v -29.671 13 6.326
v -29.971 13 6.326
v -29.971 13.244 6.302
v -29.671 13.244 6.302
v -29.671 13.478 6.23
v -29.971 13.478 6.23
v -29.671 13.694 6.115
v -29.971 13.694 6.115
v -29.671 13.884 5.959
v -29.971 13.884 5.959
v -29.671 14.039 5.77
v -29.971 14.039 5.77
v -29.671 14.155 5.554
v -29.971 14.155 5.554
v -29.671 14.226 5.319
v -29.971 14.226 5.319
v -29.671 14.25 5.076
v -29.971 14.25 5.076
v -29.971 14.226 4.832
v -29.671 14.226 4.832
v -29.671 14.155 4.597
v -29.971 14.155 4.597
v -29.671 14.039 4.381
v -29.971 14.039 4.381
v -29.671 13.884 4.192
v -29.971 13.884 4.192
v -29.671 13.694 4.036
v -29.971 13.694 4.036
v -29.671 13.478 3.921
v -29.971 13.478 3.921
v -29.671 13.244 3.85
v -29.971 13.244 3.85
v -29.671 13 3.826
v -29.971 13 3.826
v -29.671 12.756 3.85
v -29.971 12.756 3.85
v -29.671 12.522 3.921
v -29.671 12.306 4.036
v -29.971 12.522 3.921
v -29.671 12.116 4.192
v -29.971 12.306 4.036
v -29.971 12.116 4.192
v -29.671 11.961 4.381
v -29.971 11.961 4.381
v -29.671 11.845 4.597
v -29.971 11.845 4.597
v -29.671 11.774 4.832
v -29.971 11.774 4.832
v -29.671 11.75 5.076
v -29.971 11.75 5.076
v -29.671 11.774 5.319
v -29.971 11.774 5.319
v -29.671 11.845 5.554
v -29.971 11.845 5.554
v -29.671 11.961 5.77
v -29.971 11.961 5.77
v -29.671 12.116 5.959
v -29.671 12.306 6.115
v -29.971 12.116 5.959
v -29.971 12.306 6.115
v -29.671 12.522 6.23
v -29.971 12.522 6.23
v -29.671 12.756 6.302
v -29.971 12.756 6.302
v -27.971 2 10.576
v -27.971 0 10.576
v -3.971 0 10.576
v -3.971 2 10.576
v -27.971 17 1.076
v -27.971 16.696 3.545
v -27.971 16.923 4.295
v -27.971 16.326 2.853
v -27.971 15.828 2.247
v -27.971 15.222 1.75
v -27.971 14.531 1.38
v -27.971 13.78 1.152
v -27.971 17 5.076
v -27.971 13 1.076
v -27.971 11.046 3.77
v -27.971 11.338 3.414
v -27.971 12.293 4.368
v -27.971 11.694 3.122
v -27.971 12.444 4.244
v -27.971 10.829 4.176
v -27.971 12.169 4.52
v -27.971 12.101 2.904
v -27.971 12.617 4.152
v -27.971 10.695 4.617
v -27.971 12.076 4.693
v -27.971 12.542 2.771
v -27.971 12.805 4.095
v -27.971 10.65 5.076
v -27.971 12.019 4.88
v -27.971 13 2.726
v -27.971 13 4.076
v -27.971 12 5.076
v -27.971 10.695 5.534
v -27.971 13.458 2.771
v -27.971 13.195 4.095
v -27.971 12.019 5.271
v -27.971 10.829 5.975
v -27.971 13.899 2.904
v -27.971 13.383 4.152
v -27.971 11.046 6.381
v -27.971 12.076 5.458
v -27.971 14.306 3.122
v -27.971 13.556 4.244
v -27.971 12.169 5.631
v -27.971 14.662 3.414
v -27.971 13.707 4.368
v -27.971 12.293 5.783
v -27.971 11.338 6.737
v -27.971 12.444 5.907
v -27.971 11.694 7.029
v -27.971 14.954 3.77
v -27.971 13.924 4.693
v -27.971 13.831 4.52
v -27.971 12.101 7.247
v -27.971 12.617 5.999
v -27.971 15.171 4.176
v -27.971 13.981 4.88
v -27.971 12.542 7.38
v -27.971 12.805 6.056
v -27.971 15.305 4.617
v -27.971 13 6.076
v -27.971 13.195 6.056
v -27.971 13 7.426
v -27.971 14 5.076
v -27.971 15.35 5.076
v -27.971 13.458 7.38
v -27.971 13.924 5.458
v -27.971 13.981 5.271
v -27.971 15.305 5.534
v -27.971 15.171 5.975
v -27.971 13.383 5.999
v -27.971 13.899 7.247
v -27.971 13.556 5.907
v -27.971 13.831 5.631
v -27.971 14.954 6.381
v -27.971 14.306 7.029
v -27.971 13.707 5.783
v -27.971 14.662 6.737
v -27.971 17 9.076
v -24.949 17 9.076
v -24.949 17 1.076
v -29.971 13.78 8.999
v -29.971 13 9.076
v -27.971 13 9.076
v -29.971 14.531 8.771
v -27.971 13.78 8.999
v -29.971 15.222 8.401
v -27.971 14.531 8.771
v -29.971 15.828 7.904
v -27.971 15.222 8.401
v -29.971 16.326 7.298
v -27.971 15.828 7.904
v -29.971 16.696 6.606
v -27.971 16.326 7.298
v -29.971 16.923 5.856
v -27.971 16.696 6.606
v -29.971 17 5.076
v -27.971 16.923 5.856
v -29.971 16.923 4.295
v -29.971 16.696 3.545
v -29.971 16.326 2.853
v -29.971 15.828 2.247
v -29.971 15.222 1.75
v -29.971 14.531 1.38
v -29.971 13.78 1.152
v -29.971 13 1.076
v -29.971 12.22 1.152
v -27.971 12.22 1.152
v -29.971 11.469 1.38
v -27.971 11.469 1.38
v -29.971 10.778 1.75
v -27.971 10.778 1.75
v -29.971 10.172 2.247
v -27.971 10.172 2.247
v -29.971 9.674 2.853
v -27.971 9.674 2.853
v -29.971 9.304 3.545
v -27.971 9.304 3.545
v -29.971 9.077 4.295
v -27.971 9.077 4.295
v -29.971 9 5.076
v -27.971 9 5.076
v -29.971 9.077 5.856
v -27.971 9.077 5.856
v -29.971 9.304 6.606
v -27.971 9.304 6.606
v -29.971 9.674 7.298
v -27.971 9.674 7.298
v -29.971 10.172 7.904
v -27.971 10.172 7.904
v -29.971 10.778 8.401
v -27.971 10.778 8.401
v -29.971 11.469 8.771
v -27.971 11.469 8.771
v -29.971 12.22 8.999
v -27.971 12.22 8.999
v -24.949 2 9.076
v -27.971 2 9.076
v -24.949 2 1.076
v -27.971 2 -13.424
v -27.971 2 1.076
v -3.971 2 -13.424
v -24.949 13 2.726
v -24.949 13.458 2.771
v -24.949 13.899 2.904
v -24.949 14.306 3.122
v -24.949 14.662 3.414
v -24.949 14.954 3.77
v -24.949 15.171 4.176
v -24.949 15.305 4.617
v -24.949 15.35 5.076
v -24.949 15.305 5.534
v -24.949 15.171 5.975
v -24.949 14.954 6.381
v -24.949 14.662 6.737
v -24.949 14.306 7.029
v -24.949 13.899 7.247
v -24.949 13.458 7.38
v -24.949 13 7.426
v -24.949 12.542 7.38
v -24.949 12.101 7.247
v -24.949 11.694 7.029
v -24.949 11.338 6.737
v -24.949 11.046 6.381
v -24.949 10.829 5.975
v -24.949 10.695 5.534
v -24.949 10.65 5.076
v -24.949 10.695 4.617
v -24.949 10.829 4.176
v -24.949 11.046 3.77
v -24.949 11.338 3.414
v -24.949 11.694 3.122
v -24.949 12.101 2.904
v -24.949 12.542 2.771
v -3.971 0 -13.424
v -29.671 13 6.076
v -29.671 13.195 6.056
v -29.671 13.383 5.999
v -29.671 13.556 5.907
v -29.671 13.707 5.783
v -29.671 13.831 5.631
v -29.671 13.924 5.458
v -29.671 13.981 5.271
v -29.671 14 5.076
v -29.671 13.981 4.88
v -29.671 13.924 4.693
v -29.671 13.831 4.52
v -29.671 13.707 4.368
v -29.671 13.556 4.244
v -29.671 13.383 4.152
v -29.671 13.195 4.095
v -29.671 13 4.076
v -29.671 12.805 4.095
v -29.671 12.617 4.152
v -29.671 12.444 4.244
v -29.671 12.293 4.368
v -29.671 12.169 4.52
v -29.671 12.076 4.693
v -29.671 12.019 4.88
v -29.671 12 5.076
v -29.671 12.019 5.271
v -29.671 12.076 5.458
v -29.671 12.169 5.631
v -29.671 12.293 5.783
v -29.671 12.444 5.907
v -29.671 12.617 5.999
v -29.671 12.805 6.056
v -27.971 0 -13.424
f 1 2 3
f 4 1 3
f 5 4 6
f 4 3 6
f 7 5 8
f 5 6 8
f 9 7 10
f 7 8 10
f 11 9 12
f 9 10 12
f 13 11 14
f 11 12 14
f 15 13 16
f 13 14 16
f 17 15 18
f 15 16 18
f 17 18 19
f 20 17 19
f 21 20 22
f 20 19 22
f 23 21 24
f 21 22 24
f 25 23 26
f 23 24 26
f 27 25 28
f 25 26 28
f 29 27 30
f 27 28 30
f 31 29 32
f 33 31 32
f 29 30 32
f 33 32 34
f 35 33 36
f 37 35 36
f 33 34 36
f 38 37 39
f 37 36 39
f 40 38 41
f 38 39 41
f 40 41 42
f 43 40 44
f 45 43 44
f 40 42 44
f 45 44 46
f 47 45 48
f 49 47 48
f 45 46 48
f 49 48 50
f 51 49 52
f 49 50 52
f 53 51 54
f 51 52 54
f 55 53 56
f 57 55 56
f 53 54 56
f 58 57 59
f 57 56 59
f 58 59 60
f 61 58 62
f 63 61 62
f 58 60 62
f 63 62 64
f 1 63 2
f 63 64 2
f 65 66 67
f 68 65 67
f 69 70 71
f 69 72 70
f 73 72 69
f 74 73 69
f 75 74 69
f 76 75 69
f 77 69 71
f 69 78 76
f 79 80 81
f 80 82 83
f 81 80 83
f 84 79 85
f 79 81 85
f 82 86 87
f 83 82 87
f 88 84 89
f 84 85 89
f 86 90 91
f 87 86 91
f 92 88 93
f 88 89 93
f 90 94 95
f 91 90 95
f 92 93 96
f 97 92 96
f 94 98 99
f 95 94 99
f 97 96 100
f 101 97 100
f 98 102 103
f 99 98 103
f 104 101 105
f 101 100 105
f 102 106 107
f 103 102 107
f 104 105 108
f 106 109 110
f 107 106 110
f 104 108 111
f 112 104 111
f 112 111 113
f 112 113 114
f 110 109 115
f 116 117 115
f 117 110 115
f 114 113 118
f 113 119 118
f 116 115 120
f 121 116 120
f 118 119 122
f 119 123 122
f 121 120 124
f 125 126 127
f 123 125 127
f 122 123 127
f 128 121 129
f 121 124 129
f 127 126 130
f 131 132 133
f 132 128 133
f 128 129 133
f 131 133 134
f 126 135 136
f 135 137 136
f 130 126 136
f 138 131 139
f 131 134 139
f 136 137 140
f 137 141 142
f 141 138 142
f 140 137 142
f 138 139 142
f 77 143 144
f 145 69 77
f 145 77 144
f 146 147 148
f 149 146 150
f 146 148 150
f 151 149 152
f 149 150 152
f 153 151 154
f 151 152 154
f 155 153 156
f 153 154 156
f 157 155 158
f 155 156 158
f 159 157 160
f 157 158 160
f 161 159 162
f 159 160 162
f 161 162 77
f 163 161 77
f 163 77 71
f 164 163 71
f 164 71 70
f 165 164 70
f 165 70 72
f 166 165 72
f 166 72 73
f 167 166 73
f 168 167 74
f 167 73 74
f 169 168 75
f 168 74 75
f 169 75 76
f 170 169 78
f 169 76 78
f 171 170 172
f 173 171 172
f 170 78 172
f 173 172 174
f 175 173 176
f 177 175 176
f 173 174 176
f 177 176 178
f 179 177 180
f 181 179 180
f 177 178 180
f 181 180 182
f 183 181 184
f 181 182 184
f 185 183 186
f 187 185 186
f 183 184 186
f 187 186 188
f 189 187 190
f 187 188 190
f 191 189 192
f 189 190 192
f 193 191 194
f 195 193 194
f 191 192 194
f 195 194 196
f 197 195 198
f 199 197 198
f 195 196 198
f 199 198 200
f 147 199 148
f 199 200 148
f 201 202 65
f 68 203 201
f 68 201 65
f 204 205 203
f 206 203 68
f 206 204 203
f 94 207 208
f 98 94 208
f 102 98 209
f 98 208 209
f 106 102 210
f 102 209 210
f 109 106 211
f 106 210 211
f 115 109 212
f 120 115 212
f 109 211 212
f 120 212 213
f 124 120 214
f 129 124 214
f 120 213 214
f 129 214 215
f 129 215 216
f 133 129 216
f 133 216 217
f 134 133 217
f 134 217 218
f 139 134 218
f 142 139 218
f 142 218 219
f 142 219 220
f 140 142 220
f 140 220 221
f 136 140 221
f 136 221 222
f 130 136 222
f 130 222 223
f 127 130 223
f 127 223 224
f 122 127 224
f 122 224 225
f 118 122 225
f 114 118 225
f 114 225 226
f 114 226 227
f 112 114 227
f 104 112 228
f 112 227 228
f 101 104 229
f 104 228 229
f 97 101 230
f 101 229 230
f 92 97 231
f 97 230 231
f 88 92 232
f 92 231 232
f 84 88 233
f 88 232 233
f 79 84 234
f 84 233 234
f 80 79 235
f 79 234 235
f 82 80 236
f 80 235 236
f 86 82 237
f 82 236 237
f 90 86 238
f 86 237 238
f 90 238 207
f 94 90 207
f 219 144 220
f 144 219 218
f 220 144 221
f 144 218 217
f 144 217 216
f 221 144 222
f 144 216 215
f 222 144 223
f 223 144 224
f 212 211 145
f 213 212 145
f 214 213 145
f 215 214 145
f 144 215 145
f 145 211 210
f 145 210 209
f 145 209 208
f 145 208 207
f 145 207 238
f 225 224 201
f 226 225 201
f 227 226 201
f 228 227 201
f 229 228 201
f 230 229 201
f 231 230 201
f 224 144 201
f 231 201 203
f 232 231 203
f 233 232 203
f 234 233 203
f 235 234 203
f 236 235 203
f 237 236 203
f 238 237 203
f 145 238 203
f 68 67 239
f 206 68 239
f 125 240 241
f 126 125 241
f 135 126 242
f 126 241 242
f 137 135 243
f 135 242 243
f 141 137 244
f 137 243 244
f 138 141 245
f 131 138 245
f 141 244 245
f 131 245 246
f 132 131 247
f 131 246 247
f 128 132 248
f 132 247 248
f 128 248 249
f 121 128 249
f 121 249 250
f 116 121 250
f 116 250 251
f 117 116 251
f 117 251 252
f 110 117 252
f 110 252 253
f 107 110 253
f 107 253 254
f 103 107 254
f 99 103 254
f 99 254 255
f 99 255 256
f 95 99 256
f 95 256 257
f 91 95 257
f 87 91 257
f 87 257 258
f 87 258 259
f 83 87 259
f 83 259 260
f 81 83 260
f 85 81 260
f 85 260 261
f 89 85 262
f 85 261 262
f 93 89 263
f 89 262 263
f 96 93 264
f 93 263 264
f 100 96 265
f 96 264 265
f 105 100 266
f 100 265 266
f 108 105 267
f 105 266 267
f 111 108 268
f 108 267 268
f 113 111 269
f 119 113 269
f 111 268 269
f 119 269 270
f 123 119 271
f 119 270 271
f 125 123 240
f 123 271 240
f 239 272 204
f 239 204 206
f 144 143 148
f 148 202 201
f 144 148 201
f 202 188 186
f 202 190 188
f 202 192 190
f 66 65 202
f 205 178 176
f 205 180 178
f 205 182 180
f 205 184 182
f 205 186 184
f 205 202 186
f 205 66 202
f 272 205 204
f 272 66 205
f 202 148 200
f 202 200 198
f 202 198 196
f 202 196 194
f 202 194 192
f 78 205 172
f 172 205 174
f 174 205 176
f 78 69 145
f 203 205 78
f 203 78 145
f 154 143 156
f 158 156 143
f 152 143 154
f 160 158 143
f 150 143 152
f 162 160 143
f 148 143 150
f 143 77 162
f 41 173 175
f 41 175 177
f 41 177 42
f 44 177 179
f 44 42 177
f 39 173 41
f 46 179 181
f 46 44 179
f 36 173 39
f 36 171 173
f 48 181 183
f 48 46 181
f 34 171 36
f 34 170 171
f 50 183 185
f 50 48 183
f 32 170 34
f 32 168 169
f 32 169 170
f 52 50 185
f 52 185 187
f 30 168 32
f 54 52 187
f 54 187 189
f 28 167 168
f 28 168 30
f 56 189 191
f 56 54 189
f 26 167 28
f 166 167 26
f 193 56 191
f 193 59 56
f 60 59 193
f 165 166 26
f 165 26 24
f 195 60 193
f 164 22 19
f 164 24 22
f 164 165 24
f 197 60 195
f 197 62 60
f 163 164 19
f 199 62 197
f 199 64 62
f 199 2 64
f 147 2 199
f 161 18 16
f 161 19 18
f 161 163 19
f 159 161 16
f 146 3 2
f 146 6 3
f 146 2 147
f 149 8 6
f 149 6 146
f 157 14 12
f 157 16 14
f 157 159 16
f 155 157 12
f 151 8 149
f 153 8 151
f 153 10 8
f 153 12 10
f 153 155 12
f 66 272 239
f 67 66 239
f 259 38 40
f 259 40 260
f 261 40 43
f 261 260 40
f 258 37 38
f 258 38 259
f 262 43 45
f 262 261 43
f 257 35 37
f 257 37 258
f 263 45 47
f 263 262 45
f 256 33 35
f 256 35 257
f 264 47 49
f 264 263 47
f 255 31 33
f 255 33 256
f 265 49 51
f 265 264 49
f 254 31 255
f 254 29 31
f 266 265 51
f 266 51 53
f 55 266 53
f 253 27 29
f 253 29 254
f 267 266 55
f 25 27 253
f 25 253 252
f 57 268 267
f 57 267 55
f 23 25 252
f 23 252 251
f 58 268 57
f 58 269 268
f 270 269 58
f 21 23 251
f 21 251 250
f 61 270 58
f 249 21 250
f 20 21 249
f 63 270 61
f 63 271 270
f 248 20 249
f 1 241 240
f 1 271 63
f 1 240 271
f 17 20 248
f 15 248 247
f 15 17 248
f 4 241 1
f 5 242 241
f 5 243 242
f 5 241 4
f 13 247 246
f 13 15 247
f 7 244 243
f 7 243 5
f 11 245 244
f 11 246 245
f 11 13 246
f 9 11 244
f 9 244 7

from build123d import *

# Parameters (mm, degrees)
SKETCH3_W           = 24
SKETCH3_H           = 24
BOSS_EXTRUDE1_DEPTH = 2
SKETCH4_W           = 3.021973807
SKETCH4_H           = 8
BOSS_EXTRUDE2_DEPTH = 15
SKETCH6_R           = 2.35
CUT_EXTRUDE1_DEPTH  = 3.2
SKETCH7_R           = 4
BOSS_EXTRUDE3_DEPTH = 2
SKETCH8_R           = 1
CUT_EXTRUDE2_DEPTH  = 2
SKETCH9_R           = 1.25
CUT_EXTRUDE3_DEPTH  = 0.3


with BuildPart() as part:
    # Sketch3 → Boss-Extrude1 (new body)
    with BuildSketch(Plane(origin=(0, 0, 0), x_dir=(1, 0, 0), z_dir=(0, 1, 0))):
        with Locations((-15.971223022, 1.424460432)):
            Rectangle(SKETCH3_W, SKETCH3_H)
    extrude(amount=BOSS_EXTRUDE1_DEPTH)

    # Sketch4 → Boss-Extrude2 (add)
    with BuildSketch(Plane(origin=(0, 2, 0), x_dir=(1, 0, 0), z_dir=(0, 1, 0))):
        with Locations((-26.460236118, -5.075539568)):
            Rectangle(SKETCH4_W, SKETCH4_H)
    extrude(amount=BOSS_EXTRUDE2_DEPTH)

    # Sketch6 → Cut-Extrude1 (cut)
    with BuildSketch(Plane(origin=(-24.949249215, 0, 0), x_dir=(0, 0, -1), z_dir=(1, 0, 0))):
        with Locations((-5.075539568, 13)):
            Circle(SKETCH6_R)
    extrude(amount=-CUT_EXTRUDE1_DEPTH, mode=Mode.SUBTRACT)

    # Sketch7 → Boss-Extrude3 (add)
    with BuildSketch(Plane.ZY.offset(27.971223022)):
        with Locations((5.075539568, 13)):
            Circle(SKETCH7_R)
    extrude(amount=BOSS_EXTRUDE3_DEPTH)

    # Sketch8 → Cut-Extrude2 (cut)
    with BuildSketch(Plane.ZY.offset(29.971223022)):
        with Locations((5.075539568, 13)):
            Circle(SKETCH8_R)
    extrude(amount=-CUT_EXTRUDE2_DEPTH, mode=Mode.SUBTRACT)

    # Sketch9 → Cut-Extrude3 (cut)
    with BuildSketch(Plane.ZY.offset(29.971223022)):
        with Locations((5.075539568, 13)):
            Circle(SKETCH9_R)
    extrude(amount=-CUT_EXTRUDE3_DEPTH, mode=Mode.SUBTRACT)


solid = part.part
